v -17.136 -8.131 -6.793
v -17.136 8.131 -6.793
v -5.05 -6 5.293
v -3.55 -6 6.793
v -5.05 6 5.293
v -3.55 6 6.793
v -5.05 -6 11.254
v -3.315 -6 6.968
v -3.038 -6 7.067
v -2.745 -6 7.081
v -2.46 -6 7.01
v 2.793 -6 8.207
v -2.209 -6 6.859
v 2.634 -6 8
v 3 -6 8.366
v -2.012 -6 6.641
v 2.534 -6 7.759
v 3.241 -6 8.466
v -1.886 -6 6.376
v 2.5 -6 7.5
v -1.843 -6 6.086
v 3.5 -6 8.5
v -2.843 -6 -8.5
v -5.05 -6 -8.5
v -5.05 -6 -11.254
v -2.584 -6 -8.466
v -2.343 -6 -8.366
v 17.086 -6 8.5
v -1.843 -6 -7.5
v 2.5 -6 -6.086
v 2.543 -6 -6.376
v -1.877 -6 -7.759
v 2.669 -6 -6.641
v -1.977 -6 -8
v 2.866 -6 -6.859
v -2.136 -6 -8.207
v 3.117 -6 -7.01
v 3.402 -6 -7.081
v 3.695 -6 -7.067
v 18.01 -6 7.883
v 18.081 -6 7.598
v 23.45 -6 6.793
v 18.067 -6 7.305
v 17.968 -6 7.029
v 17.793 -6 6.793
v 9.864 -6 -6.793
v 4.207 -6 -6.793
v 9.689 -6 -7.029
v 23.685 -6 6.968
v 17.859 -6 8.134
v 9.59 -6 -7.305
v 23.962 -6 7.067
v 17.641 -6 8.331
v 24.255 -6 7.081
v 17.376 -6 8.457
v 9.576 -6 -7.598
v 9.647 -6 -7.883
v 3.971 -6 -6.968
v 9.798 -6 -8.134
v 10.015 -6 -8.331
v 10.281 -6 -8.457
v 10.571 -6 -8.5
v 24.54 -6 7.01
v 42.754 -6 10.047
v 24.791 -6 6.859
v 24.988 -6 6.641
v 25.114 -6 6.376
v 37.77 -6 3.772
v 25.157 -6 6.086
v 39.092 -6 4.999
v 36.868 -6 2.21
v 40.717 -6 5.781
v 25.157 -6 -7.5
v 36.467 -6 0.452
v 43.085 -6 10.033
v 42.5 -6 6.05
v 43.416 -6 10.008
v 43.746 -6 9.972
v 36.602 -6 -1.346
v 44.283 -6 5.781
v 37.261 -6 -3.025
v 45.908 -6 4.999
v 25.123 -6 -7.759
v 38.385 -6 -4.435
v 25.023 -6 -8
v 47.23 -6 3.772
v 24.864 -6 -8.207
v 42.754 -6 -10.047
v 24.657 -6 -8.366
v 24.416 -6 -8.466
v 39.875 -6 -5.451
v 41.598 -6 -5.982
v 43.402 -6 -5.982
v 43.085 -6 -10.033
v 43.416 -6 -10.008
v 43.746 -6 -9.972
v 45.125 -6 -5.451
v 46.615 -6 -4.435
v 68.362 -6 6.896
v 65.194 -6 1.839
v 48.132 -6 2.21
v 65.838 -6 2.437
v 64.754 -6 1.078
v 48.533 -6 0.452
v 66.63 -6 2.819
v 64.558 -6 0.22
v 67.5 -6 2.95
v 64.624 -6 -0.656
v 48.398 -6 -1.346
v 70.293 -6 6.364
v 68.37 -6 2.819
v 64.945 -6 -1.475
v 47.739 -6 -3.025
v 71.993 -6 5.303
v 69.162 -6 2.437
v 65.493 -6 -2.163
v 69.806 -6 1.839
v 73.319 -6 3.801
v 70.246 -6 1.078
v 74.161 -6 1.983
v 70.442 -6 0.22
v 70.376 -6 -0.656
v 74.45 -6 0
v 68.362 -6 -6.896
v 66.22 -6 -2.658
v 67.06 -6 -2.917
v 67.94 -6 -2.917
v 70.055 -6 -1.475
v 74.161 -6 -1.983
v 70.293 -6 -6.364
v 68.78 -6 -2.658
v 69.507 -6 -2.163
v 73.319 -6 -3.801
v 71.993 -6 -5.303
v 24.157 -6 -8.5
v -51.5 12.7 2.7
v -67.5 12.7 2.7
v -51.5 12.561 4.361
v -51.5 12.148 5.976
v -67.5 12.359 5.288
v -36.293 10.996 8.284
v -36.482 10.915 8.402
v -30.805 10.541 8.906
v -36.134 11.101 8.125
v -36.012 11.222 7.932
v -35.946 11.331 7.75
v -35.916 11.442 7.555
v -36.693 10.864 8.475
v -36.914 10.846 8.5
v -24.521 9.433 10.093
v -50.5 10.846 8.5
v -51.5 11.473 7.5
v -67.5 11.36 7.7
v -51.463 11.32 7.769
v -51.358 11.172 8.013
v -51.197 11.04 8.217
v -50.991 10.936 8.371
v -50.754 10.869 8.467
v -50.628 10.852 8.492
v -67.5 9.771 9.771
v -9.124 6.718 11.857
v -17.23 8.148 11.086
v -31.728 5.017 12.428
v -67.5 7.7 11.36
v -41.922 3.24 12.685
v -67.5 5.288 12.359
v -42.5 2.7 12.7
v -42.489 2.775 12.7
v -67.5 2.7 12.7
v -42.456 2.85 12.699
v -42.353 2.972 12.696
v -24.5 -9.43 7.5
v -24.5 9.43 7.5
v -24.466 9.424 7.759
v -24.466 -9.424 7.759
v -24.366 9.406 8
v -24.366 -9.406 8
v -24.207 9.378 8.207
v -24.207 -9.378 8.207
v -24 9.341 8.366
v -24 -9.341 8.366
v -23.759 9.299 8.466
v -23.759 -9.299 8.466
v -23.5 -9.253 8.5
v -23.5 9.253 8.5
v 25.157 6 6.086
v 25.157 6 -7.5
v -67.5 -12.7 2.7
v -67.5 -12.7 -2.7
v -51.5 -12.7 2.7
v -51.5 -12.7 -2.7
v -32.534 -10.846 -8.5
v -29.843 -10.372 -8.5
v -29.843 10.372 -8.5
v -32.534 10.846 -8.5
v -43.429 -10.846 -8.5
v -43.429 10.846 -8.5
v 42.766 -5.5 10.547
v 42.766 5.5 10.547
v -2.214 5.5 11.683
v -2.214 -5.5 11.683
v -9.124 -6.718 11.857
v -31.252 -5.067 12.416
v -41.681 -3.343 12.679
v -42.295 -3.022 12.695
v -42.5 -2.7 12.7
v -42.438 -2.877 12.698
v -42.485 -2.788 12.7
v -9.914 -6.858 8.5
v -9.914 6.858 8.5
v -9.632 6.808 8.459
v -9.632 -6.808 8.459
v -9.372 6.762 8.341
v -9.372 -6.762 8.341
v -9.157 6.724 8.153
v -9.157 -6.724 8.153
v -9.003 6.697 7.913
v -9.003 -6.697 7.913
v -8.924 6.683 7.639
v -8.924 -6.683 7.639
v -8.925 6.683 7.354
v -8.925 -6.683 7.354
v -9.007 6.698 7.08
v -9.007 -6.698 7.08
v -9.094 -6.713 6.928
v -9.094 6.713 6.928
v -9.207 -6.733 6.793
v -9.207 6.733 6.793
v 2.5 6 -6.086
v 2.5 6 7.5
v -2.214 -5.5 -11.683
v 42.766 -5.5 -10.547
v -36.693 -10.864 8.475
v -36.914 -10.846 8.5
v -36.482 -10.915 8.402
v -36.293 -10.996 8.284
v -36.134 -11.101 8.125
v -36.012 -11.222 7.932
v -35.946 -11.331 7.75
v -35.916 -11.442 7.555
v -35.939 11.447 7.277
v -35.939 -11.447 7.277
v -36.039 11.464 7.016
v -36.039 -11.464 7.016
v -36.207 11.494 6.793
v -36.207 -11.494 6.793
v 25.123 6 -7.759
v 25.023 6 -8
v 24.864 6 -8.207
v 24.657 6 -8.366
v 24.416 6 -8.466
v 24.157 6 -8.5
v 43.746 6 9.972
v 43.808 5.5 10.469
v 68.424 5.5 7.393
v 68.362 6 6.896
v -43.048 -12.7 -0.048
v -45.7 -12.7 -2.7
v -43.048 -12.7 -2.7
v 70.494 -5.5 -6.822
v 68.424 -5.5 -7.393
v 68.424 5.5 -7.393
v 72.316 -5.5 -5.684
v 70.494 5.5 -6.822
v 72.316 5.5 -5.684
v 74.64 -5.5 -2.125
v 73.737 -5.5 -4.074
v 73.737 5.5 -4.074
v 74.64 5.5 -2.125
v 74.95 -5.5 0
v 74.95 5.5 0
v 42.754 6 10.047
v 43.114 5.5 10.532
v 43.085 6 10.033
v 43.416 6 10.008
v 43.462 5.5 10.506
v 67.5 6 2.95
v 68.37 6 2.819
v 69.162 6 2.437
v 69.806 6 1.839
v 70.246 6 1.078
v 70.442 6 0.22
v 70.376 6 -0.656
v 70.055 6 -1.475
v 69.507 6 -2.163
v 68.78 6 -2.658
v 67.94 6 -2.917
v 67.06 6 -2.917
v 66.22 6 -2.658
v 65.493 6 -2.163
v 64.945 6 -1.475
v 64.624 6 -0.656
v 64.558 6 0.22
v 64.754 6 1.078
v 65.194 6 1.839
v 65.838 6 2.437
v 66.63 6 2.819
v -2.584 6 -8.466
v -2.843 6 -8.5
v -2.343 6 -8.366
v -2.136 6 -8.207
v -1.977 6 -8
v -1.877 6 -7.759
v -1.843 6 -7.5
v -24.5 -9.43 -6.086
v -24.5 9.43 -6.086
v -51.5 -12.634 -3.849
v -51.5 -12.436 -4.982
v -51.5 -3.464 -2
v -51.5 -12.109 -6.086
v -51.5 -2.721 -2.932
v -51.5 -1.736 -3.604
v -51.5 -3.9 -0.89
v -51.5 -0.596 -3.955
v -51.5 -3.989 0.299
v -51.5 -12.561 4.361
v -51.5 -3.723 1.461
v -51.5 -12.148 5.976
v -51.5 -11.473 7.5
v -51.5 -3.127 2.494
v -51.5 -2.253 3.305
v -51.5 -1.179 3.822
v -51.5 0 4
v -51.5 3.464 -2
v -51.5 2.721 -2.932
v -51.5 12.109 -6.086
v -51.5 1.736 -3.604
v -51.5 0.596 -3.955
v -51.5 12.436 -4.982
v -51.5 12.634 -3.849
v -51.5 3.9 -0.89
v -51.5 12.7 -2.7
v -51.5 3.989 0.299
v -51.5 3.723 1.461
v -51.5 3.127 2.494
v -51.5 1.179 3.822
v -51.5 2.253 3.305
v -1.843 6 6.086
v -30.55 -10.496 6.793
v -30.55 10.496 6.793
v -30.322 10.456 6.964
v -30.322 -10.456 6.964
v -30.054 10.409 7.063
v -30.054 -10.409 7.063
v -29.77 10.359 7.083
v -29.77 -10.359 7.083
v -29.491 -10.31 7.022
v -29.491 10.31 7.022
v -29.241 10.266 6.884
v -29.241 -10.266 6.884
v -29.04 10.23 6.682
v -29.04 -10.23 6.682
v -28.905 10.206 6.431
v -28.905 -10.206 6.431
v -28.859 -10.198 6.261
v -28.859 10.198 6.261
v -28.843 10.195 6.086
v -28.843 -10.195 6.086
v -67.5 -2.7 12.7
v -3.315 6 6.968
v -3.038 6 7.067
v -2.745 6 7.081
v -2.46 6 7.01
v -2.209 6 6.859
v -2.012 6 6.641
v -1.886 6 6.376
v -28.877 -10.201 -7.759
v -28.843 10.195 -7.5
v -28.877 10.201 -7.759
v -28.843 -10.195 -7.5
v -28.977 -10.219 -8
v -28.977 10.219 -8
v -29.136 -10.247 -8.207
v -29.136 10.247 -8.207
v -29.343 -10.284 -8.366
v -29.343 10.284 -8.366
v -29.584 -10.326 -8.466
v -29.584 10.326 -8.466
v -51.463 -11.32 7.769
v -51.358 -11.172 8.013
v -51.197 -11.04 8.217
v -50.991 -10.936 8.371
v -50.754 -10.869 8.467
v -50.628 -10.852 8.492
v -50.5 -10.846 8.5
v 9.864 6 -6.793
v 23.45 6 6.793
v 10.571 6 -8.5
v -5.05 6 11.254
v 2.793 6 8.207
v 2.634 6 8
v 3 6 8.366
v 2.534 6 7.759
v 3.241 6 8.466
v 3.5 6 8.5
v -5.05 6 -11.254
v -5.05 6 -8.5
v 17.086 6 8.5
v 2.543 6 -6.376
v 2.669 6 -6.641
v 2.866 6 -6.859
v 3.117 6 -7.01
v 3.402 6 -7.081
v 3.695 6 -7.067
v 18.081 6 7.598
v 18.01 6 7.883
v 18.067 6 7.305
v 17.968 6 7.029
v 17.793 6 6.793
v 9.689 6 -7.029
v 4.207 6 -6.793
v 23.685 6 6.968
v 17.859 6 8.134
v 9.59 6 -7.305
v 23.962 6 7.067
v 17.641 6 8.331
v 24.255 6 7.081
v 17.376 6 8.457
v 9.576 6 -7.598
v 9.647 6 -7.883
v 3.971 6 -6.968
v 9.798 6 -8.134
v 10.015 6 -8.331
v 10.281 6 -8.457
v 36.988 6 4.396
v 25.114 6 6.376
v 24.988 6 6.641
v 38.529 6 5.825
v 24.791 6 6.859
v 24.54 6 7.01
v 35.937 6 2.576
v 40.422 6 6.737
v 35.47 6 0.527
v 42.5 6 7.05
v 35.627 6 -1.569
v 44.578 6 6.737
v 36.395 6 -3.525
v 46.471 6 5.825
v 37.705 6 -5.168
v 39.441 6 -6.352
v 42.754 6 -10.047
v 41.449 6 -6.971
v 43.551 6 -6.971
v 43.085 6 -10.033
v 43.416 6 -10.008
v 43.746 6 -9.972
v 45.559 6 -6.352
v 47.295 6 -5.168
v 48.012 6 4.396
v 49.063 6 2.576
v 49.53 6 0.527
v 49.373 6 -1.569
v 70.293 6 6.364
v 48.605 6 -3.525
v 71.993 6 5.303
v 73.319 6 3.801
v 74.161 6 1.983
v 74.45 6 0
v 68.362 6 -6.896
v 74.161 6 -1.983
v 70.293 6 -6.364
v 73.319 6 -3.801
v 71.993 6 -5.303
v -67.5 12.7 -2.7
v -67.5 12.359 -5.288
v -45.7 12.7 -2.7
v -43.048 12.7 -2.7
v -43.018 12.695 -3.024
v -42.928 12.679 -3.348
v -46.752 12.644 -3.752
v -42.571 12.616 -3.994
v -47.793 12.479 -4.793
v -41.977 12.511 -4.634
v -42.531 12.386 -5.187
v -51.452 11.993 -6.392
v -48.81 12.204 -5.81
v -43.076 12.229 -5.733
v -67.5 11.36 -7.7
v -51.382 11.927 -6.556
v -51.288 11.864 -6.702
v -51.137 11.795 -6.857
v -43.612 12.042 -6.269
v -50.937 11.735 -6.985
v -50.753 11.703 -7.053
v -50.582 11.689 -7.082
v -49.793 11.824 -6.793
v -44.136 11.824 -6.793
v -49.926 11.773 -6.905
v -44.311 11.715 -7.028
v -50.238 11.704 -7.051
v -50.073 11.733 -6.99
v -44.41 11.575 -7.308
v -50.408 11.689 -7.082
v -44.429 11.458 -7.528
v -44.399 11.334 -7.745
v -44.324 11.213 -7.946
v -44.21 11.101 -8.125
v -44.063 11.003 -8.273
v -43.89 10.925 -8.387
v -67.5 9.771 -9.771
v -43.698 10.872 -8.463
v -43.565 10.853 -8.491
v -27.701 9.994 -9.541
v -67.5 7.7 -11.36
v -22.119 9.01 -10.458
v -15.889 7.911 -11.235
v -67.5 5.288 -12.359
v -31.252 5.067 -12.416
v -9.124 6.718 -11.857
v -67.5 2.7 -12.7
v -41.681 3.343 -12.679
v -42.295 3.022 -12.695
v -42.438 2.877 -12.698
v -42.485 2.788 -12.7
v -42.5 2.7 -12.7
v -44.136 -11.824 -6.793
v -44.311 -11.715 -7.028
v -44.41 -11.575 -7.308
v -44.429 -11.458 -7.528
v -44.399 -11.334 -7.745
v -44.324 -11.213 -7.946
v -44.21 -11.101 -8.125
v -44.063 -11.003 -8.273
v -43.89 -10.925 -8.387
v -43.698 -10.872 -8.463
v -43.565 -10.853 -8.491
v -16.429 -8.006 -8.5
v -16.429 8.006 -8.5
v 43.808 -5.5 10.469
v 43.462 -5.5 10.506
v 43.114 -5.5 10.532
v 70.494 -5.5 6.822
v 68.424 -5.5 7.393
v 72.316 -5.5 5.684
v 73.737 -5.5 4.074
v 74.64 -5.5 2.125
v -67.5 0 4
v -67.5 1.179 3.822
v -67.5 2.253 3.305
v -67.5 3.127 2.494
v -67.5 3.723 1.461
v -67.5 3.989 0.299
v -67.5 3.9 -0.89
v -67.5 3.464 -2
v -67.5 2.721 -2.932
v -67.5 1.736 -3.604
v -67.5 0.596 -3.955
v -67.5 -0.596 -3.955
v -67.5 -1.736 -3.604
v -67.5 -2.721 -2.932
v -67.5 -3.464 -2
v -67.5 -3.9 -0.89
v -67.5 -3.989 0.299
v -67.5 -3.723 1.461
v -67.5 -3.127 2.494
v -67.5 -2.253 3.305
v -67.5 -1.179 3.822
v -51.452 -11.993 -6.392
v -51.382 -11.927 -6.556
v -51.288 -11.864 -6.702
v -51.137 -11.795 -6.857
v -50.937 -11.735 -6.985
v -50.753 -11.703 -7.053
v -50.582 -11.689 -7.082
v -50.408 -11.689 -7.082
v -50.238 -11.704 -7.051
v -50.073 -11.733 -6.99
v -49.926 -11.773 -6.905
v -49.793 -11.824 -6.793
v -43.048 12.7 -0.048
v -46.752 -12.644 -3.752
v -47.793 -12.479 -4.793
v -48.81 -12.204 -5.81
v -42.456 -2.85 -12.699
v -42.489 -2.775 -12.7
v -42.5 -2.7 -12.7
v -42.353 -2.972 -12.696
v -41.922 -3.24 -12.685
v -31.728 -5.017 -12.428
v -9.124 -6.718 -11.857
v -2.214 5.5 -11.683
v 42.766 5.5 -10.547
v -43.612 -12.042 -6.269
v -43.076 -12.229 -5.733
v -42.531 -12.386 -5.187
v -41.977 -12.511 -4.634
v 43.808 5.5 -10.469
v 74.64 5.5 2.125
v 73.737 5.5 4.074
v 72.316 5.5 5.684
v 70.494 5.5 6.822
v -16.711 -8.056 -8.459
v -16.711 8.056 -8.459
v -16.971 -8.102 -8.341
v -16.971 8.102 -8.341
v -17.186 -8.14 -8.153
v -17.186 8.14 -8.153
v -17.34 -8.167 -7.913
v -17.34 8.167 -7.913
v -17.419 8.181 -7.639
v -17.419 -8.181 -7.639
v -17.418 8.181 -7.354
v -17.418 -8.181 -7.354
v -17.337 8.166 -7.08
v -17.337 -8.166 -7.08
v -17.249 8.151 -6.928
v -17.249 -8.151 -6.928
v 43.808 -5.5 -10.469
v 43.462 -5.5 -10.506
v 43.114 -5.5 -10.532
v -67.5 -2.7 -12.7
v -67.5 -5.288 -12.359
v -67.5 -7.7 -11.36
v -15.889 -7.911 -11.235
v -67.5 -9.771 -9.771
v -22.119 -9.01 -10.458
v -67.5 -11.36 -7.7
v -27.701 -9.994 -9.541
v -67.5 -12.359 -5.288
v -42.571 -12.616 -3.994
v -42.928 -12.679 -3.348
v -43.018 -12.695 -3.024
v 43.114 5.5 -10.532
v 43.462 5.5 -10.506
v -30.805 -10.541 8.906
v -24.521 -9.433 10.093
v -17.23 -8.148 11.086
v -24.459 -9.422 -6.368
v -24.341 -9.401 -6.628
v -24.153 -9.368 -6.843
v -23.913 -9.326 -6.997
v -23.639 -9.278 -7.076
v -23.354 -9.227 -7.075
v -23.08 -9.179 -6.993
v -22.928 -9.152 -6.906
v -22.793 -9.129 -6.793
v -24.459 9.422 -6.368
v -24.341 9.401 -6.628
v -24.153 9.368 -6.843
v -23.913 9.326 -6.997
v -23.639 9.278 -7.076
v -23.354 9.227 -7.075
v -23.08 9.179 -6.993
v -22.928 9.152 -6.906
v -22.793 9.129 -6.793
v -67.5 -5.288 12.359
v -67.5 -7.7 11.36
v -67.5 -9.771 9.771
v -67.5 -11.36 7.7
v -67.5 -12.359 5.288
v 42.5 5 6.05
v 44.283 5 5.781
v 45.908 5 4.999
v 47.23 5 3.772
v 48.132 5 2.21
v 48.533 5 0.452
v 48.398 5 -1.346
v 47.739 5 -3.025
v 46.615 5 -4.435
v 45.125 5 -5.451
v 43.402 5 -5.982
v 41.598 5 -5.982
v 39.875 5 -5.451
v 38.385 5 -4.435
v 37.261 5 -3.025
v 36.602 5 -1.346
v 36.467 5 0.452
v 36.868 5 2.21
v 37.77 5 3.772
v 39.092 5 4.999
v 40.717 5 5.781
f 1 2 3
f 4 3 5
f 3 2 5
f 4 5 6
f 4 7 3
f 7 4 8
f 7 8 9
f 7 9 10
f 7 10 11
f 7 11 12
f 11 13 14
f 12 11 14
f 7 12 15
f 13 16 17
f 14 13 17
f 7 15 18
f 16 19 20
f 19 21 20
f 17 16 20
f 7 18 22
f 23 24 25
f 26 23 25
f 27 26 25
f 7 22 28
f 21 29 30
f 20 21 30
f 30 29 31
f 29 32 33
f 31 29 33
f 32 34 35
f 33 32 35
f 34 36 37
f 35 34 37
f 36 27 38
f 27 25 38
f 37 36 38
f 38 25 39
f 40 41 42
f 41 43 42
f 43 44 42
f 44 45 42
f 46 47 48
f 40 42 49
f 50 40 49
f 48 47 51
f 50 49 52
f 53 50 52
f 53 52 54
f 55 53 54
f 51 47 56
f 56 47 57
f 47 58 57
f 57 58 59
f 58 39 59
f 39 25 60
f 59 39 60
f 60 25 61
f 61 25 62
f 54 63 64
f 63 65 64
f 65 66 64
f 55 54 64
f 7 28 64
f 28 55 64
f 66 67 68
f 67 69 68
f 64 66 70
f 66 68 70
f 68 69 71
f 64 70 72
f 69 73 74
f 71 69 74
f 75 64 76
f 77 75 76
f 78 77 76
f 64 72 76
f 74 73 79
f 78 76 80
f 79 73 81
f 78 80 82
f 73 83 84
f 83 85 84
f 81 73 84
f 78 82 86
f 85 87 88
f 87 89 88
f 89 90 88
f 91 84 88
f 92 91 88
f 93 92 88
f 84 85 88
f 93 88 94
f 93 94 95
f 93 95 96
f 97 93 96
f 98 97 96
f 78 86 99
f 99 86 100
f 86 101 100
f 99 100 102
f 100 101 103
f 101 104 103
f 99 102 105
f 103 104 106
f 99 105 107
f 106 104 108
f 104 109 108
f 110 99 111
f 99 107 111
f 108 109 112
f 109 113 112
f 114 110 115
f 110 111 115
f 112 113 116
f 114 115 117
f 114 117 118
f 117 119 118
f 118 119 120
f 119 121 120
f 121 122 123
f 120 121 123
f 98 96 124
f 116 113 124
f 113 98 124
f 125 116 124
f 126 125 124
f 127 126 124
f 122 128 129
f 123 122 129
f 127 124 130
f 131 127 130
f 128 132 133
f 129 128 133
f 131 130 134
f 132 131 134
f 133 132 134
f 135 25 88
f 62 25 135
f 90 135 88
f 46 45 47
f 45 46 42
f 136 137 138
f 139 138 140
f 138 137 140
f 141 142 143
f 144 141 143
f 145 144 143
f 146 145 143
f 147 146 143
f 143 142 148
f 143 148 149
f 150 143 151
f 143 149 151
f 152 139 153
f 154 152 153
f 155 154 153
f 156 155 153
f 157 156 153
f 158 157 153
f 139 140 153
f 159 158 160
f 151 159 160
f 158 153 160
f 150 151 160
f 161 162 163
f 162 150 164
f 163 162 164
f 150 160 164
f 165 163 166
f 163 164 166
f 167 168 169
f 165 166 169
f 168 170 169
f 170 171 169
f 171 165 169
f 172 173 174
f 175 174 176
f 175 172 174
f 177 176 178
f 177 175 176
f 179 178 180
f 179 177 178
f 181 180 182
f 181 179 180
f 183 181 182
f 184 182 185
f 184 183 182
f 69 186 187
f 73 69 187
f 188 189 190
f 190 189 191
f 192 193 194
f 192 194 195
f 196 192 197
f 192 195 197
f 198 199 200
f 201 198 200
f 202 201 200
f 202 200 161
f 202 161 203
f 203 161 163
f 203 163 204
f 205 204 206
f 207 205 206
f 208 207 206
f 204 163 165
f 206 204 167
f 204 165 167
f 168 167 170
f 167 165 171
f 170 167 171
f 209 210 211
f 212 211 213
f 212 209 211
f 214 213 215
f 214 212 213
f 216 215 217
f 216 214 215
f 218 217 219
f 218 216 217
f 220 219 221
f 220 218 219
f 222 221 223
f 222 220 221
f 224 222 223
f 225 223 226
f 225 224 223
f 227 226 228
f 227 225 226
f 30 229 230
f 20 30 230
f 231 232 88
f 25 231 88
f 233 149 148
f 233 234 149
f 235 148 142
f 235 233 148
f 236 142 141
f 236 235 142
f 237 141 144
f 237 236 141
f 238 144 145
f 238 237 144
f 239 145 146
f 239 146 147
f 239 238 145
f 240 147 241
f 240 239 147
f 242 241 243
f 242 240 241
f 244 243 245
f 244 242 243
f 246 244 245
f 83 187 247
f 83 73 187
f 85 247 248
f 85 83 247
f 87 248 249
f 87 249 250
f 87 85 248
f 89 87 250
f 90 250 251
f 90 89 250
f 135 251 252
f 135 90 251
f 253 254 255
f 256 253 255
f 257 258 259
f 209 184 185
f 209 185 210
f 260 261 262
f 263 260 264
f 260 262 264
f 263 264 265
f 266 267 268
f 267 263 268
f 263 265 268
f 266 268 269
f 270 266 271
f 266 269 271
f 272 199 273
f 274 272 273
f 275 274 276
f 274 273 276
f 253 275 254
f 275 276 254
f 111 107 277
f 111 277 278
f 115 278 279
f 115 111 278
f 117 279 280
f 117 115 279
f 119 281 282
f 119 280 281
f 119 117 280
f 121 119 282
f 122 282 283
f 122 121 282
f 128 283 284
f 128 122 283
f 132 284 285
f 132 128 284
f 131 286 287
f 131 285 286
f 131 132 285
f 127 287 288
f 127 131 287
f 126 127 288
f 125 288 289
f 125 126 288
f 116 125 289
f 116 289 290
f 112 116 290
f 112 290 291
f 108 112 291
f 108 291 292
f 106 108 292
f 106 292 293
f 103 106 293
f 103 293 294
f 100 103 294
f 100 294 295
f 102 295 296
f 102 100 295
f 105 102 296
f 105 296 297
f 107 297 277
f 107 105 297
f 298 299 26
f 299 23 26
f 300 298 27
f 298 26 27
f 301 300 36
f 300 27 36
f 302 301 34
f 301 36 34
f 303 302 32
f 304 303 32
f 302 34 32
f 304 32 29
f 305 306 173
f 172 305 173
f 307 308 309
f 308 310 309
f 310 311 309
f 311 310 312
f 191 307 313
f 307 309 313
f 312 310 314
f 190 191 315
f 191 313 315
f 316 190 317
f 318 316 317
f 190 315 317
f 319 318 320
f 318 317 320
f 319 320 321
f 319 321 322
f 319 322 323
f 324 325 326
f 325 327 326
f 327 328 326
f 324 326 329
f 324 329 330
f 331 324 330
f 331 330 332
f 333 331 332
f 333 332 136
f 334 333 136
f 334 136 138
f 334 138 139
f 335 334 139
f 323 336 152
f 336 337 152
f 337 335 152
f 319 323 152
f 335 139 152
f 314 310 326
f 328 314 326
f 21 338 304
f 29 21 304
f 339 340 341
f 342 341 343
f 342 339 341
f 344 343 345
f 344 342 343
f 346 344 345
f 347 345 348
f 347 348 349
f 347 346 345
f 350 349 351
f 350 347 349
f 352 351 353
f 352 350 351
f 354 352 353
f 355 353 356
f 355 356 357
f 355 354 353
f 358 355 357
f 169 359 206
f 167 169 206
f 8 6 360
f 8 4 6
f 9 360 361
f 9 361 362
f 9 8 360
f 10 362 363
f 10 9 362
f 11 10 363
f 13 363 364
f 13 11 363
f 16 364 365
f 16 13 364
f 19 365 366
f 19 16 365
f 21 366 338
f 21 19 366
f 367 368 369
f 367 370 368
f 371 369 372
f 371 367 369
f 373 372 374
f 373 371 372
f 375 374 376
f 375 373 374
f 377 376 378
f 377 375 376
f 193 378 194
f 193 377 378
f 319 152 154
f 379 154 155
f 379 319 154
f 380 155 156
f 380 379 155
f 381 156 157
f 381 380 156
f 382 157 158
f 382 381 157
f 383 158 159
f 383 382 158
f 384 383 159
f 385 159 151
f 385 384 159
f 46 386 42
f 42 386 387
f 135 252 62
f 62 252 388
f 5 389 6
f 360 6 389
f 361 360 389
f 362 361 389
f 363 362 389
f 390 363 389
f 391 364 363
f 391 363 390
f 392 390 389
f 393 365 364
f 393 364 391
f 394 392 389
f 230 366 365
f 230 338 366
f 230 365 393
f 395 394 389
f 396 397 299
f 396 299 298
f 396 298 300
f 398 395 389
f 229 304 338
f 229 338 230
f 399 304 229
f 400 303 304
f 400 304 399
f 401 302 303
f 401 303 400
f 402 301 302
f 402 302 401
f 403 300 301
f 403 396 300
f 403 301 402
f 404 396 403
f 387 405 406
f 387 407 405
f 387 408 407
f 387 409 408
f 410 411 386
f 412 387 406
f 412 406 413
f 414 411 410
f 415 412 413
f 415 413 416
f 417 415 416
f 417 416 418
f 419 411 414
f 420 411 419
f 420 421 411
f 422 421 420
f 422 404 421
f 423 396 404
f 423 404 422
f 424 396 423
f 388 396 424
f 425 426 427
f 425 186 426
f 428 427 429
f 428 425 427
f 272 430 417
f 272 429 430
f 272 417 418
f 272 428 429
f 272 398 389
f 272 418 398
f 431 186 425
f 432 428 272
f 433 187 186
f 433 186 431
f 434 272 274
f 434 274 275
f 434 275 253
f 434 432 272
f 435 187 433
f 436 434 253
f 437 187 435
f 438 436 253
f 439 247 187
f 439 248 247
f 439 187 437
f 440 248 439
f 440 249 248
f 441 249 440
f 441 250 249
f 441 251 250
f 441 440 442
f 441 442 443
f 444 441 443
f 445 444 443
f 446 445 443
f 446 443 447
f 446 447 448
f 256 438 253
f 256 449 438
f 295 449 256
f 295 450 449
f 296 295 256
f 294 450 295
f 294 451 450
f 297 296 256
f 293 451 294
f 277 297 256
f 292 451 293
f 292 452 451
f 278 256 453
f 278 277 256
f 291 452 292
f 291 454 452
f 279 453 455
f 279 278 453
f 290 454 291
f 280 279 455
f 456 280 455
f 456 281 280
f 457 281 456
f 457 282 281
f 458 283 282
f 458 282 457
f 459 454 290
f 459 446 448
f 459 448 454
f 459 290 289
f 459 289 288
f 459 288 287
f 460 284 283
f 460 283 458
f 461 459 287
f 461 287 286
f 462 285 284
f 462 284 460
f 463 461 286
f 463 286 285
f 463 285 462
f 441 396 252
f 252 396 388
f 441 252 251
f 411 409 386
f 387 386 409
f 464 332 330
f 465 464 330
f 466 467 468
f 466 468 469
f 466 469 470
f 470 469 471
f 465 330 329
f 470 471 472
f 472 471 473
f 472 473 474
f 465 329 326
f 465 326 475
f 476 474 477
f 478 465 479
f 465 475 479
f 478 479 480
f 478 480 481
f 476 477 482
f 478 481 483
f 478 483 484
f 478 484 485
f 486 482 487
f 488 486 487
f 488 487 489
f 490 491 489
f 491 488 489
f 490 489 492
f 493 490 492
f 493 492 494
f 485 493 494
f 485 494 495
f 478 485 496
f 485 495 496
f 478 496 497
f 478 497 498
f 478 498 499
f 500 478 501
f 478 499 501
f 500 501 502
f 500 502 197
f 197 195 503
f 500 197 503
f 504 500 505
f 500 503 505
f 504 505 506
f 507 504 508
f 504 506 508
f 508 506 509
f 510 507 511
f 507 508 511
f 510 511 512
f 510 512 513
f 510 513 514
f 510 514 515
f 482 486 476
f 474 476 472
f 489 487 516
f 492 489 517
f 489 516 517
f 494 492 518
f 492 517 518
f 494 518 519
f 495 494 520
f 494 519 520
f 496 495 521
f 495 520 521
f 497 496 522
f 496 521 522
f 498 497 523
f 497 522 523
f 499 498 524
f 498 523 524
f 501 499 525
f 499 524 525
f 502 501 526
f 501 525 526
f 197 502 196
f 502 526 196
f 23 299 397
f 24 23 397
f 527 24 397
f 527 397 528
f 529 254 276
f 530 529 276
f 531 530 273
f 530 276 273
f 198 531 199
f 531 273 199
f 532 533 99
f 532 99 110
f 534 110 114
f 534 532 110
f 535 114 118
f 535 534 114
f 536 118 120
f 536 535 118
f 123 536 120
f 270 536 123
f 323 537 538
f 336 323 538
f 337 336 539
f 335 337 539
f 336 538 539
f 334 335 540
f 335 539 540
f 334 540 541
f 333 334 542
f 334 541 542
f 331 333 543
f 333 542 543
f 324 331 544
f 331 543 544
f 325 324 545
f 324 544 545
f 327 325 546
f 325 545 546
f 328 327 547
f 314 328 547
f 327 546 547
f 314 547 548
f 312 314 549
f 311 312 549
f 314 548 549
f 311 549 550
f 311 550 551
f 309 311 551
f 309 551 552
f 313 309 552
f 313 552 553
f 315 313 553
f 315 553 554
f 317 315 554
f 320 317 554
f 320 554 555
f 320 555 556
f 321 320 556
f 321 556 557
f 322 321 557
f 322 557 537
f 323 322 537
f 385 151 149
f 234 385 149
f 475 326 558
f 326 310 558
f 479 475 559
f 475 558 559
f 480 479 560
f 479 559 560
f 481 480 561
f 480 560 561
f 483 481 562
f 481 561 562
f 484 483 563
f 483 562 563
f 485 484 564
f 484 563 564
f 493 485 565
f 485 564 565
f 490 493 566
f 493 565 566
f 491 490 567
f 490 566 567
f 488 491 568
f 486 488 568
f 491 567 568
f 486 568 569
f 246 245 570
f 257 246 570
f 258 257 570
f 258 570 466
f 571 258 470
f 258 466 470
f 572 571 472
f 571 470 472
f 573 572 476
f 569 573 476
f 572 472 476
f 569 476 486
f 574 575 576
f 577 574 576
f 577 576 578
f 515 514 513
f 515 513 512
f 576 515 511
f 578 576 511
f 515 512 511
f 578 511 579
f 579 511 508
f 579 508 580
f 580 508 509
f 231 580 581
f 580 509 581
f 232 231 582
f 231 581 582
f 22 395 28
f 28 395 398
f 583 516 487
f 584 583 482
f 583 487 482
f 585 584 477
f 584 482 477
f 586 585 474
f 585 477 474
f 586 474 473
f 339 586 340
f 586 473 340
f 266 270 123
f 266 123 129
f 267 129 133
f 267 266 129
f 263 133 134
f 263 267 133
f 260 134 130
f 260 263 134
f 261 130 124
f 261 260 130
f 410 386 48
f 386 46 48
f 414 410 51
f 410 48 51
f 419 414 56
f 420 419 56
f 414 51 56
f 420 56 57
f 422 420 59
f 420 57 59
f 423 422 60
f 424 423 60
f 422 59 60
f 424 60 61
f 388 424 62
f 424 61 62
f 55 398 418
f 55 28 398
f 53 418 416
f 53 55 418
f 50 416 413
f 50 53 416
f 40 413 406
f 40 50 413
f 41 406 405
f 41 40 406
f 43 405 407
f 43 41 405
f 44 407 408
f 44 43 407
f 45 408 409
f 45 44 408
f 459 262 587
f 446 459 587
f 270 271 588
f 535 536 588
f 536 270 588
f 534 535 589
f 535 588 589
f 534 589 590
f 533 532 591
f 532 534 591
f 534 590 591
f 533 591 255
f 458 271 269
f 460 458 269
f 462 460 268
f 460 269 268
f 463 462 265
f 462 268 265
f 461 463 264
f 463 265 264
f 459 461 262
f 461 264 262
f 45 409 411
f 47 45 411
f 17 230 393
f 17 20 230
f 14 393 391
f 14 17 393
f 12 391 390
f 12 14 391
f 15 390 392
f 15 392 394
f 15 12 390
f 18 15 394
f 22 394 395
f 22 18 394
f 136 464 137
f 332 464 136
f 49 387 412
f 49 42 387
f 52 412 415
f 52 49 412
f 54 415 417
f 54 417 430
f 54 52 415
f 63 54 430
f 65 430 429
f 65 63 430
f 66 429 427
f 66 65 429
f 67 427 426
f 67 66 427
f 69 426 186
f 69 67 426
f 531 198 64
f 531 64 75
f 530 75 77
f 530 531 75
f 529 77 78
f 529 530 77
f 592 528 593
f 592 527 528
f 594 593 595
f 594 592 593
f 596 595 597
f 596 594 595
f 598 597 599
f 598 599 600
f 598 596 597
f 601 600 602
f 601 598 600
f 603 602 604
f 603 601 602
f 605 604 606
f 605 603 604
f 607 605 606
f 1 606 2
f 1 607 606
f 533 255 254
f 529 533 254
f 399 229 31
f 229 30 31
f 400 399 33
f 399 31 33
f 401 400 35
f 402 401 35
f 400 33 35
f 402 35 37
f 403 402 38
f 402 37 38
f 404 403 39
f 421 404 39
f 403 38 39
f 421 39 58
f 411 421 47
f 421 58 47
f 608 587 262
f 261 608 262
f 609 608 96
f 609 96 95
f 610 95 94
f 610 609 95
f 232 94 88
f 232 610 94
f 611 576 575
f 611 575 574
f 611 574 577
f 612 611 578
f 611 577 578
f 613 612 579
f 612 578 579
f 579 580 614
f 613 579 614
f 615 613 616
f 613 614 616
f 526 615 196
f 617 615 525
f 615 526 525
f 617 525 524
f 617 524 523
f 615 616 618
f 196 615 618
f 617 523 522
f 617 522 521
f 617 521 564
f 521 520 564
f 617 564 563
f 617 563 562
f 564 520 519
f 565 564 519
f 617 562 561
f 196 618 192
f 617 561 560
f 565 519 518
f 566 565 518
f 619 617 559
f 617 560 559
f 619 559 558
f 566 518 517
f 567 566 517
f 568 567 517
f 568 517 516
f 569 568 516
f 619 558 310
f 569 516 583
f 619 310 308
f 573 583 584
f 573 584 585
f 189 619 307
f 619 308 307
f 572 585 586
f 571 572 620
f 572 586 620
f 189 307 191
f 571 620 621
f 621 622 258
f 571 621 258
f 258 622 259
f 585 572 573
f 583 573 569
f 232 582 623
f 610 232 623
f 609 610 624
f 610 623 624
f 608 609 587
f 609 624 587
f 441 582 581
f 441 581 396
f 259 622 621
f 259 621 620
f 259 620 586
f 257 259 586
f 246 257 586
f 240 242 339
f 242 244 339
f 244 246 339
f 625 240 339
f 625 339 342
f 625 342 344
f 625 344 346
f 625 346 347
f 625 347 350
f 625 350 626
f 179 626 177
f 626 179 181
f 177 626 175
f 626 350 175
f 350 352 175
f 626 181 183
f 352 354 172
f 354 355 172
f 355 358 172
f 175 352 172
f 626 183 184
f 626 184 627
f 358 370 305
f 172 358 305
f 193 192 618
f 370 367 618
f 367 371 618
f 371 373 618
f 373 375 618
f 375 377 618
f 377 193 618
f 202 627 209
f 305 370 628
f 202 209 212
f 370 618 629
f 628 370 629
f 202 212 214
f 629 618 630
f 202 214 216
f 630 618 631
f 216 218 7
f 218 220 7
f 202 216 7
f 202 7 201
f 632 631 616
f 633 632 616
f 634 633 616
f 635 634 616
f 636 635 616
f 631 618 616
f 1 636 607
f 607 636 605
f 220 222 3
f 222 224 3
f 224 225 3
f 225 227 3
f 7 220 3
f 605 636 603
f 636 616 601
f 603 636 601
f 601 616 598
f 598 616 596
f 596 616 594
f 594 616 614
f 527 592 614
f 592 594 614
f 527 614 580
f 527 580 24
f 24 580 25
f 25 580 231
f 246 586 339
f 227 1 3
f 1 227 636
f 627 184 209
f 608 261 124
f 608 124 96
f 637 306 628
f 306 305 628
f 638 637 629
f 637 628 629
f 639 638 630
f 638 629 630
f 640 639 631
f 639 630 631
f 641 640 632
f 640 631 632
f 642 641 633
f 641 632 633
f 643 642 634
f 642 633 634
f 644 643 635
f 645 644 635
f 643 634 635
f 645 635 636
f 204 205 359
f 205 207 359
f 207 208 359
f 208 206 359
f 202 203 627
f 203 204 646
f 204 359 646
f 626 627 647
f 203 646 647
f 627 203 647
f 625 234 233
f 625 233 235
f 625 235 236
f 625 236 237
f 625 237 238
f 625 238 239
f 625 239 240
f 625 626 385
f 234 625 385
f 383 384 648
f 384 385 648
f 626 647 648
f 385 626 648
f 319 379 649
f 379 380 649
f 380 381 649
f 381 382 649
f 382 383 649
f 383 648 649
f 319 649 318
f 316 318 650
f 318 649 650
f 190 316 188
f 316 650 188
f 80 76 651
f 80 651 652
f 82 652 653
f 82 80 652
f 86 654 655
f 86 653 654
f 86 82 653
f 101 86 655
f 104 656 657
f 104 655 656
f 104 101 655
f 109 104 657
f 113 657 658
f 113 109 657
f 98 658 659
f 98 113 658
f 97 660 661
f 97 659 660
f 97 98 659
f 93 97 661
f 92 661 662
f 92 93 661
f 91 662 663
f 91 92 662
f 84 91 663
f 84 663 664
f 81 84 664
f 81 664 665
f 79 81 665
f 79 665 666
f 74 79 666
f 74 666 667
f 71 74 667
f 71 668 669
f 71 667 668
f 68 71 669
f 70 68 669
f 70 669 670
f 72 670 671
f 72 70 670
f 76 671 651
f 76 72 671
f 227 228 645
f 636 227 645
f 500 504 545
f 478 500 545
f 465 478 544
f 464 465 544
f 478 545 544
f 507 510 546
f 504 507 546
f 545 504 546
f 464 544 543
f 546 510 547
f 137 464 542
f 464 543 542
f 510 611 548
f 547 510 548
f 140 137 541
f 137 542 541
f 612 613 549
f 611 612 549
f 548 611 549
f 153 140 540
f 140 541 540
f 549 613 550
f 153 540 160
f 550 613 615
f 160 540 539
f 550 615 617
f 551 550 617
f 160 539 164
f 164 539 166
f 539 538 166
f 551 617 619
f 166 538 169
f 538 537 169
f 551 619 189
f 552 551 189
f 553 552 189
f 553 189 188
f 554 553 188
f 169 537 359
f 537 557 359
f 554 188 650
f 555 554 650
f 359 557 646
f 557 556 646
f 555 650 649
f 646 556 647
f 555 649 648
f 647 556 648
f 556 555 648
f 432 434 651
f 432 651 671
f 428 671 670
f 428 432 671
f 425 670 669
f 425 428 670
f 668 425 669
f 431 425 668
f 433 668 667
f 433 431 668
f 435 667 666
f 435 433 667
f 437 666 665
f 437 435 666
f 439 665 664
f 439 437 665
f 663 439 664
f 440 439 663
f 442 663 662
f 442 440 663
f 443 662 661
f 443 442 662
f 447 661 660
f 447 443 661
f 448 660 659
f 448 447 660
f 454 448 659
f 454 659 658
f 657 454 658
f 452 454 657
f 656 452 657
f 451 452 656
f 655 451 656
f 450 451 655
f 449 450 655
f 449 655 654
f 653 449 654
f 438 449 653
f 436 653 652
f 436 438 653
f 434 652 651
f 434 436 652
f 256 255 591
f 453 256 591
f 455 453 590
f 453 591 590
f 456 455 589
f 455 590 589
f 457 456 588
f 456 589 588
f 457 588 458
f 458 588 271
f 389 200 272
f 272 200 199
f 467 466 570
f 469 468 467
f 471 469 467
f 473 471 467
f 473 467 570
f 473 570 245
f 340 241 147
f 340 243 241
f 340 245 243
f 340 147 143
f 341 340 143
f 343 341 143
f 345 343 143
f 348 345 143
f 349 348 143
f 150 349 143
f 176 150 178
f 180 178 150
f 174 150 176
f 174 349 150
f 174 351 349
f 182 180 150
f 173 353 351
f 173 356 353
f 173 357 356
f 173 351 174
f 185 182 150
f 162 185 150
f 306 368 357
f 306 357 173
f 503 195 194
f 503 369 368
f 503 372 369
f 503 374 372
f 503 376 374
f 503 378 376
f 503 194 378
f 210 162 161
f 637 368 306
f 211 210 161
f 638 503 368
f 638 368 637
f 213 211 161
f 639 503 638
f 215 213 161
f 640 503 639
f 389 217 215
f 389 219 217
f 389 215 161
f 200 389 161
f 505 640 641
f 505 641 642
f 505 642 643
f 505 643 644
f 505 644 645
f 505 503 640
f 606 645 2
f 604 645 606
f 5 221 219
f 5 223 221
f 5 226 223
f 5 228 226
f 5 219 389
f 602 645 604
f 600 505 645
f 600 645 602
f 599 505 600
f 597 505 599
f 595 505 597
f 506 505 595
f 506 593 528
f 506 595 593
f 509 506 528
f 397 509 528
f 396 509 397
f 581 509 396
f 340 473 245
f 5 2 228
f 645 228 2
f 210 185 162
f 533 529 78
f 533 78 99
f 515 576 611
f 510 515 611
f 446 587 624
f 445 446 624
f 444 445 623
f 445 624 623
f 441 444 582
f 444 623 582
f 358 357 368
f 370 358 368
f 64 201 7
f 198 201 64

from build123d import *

# Parameters (mm, degrees)
BOSS_EXTRUDE1_DEPTH      = 12.7
BOSS_EXTRUDE1_DEPTH_BACK = 12.7
SKETCH1_R                = 2.95
SKETCH1_R_2              = 6.05
CUT_EXTRUDE4_DEPTH       = 86.079315935
CUT_EXTRUDE1_DEPTH       = 81.149563318
FILLET8_R                = 10
CUT_EXTRUDE5_DEPTH       = 81.149563318
FILLET9_R                = 1
LPATTERN1_COUNT          = 3
LPATTERN1_PITCH          = 27
FILLET9_OF_LPATTERN1_R   = 1
CHAMFER2_SIZE            = 0.5
SKETCH8_R                = 4
CUT_EXTRUDE6_DEPTH       = 18
CHAMFER3_SIZE            = 1


with BuildPart() as part:
    # Sketch1 → Boss-Extrude1 (new, two sides: drawn at the far end of the back side and taken through both)
    with BuildSketch(Plane(origin=(0, 0, 0), x_dir=(1, 0, 0), z_dir=(0, 1, 0)).offset(-BOSS_EXTRUDE1_DEPTH_BACK)):
        with BuildLine():
            Line((-67.5, -12.7), (67.5, -12.7))
            ThreePointArc((67.5, -12.7), (80.2, 0), (67.5, 12.7))
            Line((67.5, 12.7), (-67.5, 12.7))
            Line((-67.5, 12.7), (-67.5, -12.7))
        make_face()
        with Locations(Location((67.5, 0, 0), (0, 0, 270))):
            Circle(SKETCH1_R, mode=Mode.SUBTRACT)
        with Locations(Location((42.5, 0, 0), (0, 0, 270))):
            Circle(SKETCH1_R_2, mode=Mode.SUBTRACT)
    extrude(amount=BOSS_EXTRUDE1_DEPTH + BOSS_EXTRUDE1_DEPTH_BACK)

    # Sketch6 → Cut-Extrude4 (cut, through all)
    with BuildSketch(Plane(origin=(0, 12.7, 0), x_dir=(1, 0, 0), z_dir=(0, 1, 0))):
        with BuildLine():
            Line((68.4238, -7.392502524), (43.8082, -10.468577399))
            ThreePointArc((43.8082, -10.468577399), (43.288242133, -10.520512076), (42.766350508, -10.546637256))
            Line((42.766350508, -10.546637256), (-42.5, -12.7))
            Line((-42.5, -12.7), (67.5, -12.7))
            ThreePointArc((67.5, -12.7), (80.2, 0), (67.5, 12.7))
            Line((67.5, 12.7), (-42.5, 12.7))
            Line((-42.5, 12.7), (42.766350508, 10.546637256))
            ThreePointArc((42.766350508, 10.546637256), (43.288242133, 10.520512076), (43.8082, 10.468577399))
            Line((43.8082, 10.468577399), (68.4238, 7.392502524))
            ThreePointArc((68.4238, 7.392502524), (73.085016115, 4.930526848), (74.95, 0))
            ThreePointArc((74.95, 0), (73.085016115, -4.930526848), (68.4238, -7.392502524))
        make_face()
    extrude(amount=-CUT_EXTRUDE4_DEPTH, mode=Mode.SUBTRACT)

    # Sketch2 → Cut-Extrude1 (cut, through all)
    with BuildSketch(Plane(origin=(0, 0, -12.7), x_dir=(-1, 0, 0), z_dir=(0, 0, -1))):
        Polygon((-74.95, 12.7), (43.047588191, 12.7), (5.05, 6), (-74.95, 6), align=None)
        Polygon((-74.95, -12.7), (43.047588191, -12.7), (5.05, -6), (-74.95, -6), align=None)
    extrude(amount=-CUT_EXTRUDE1_DEPTH, mode=Mode.SUBTRACT)

    # Fillet8
    # the kernel refuses this fillet: 10 mm, written as the material it takes off along each edge
    with BuildSketch(Plane(origin=(-127.5, -12.7, 12.7), x_dir=(0, 1, 0), z_dir=(1, 0, 0)), Plane(origin=(16.952411809, -12.7, -12.7), x_dir=(0, 1, 0), z_dir=(-1, 0, 0))) as fillet8_piece_1:
        with BuildLine():
            CenterArc((FILLET8_R, -FILLET8_R), FILLET8_R, 90, 90)
            Line((0, -FILLET8_R), (-FILLET8_R * 0.02, -FILLET8_R))
            Line((-FILLET8_R * 0.02, -FILLET8_R), (-FILLET8_R * 0.02, FILLET8_R * 0.02))
            Line((-FILLET8_R * 0.02, FILLET8_R * 0.02), (FILLET8_R, FILLET8_R * 0.02))
            Line((FILLET8_R, FILLET8_R * 0.02), (FILLET8_R, 0))
        make_face()
    extrude(amount=144.452411809, mode=Mode.SUBTRACT)
    with BuildSketch(Plane(origin=(-127.5, 12.7, 12.7), x_dir=(0, -1, 0), z_dir=(1, 0, 0)), Plane(origin=(16.952411809, 12.7, -12.7), x_dir=(0, -1, 0), z_dir=(-1, 0, 0))) as fillet8_piece_2:
        with BuildLine():
            CenterArc((FILLET8_R, FILLET8_R), FILLET8_R, 180, 90)
            Line((0, FILLET8_R), (-FILLET8_R * 0.02, FILLET8_R))
            Line((-FILLET8_R * 0.02, FILLET8_R), (-FILLET8_R * 0.02, -FILLET8_R * 0.02))
            Line((-FILLET8_R * 0.02, -FILLET8_R * 0.02), (FILLET8_R, -FILLET8_R * 0.02))
            Line((FILLET8_R, -FILLET8_R * 0.02), (FILLET8_R, 0))
        make_face()
    extrude(amount=144.452411809, mode=Mode.SUBTRACT)

    # Sketch7 → Cut-Extrude5 (cut, through all)
    with BuildSketch(Plane(origin=(0, 12.7, 0), x_dir=(1, 0, 0), z_dir=(0, 1, 0))):
        Polygon((-51.5, 8.5), (-51.5, -8.5), (-34.5, -8.5), align=None)
        Polygon((-45.843145751, 8.5), (-28.843145751, -8.5), (-28.843145751, 8.5), align=None)
    cut_extrude5 = extrude(amount=-CUT_EXTRUDE5_DEPTH, mode=Mode.SUBTRACT)

    # Fillet9
    fillet9_edges = [part.edges().sort_by_distance(p)[0] for p in [
        (-28.843145751, 0, -8.5),
        (-45.843145751, 0, -8.5),
        (-28.843145751, 0, 8.5),
        (-34.5, 0, 8.5),
        (-51.5, 0, -8.5),
        (-51.5, 0, 8.5),
    ]]
    fillet(fillet9_edges, radius=FILLET9_R)

    # LPattern1: Cut-Extrude5 ×3
    with Locations(*[(i * LPATTERN1_PITCH, 0, 0) for i in range(1, LPATTERN1_COUNT)]):
        add(cut_extrude5, mode=Mode.SUBTRACT)

    # Fillet9 of LPattern1
    fillet9_of_lpattern1_edges = [part.edges().sort_by_distance(p)[0] for p in [
        (-1.843145751, 0, -8.5),
        (-18.843145751, 0, -8.5),
        (-1.843145751, 0, 8.5),
        (-7.5, 0, 8.5),
        (-24.5, 0, -8.5),
        (-24.5, 0, 8.5),
        (25.156854249, 0, -8.5),
        (8.156854249, 0, -8.5),
        (25.156854249, 0, 8.5),
        (19.5, 0, 8.5),
        (2.5, 0, -8.5),
        (2.5, 0, 8.5),
    ]]
    fillet(fillet9_of_lpattern1_edges, radius=FILLET9_OF_LPATTERN1_R)

    # Chamfer2
    chamfer2_edges = [part.edges().sort_by_distance(p)[0] for p in [
        (18.858175254, -6, 11.150427304),
        (56.116, -6, -8.930539961),
        (18.858175254, -6, -11.150427304),
        (43.288242133, -6, -10.520512076),
        (74.95, -6, 0),
        (43.288242133, -6, 10.520512076),
        (56.116, -6, 8.930539961),
        (56.116, 6, 8.930539961),
        (56.116, 6, -8.930539961),
        (18.858175254, 6, 11.150427304),
        (43.288242133, 6, -10.520512076),
        (18.858175254, 6, -11.150427304),
        (74.95, 6, 0),
        (43.288242133, 6, 10.520512076),
    ]]
    chamfer(chamfer2_edges, length=CHAMFER2_SIZE)

    # Sketch8 → Cut-Extrude6 (cut)
    with BuildSketch(Plane.ZY.offset(67.5)):
        Circle(SKETCH8_R)
    extrude(amount=-CUT_EXTRUDE6_DEPTH, mode=Mode.SUBTRACT)

    # Chamfer3
    chamfer3_edges = [part.edges().sort_by_distance(p)[0] for p in [
        (42.5, 6, -6.05),
    ]]
    chamfer(chamfer3_edges, length=CHAMFER3_SIZE)


solid = part.part
